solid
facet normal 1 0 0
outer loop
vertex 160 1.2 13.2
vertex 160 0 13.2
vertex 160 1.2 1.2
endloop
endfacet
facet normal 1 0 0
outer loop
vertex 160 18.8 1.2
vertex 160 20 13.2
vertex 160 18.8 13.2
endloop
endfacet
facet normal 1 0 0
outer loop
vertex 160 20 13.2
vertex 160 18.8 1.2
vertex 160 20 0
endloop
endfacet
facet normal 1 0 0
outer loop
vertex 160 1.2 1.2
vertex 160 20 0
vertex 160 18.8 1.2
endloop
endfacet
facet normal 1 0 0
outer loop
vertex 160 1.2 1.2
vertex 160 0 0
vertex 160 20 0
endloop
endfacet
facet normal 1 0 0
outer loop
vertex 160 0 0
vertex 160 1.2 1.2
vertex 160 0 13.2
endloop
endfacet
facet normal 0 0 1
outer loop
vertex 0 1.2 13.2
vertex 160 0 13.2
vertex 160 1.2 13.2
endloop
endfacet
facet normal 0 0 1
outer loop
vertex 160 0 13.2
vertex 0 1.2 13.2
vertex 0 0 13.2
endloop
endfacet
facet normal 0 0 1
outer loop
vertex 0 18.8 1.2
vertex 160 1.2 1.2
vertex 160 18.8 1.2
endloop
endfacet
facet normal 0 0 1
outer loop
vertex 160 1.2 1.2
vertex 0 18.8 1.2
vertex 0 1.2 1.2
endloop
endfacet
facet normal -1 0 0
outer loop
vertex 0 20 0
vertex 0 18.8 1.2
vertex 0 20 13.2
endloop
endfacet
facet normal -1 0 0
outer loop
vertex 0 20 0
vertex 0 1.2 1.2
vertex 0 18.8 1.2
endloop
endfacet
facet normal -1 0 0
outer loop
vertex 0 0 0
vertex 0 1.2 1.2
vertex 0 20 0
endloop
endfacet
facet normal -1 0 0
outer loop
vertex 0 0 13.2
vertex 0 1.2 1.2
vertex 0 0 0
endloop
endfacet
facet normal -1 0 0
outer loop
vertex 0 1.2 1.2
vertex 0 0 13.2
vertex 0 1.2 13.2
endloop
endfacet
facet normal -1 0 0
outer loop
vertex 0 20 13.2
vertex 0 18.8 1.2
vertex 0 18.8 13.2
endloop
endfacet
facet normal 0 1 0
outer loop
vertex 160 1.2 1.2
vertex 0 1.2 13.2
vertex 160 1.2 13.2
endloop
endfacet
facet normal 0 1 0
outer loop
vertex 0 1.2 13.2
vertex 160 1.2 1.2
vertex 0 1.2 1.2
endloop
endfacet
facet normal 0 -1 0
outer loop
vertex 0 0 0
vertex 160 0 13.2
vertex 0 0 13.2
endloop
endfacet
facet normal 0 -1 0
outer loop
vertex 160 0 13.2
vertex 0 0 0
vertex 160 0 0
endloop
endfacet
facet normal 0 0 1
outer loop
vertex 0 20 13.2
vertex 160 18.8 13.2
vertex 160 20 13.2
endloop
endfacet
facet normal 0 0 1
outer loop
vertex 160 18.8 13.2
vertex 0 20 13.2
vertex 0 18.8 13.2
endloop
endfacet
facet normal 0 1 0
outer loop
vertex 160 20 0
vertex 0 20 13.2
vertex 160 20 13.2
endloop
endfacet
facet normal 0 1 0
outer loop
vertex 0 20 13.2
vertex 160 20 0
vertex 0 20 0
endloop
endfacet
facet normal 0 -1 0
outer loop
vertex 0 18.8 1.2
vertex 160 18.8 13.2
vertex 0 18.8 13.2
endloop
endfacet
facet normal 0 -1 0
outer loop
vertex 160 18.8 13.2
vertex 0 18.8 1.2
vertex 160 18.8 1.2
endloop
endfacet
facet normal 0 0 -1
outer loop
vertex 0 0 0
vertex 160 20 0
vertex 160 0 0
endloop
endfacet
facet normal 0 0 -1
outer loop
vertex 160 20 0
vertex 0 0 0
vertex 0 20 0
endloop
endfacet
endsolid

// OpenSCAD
// ScienceClaw nominal U-channel. All dimensions in millimeters.
// Clamp the first clamp_length along x. No holes or clamp reinforcement.
// Print parameters, layer orientation, material batch, and actual dimensions
// must be recorded separately; this file does not prescribe a qualified process.
length = 160;
clamp_length = 25;
base_width = 20;
wall_height = 12;
thickness = 1.2;
assert(length > clamp_length && clamp_length > 0);
assert(base_width > 2 * thickness && thickness > 0 && wall_height >= 0);
union() {
    cube([length, base_width, thickness]);
    if (wall_height > 0) {
        translate([0, 0, thickness]) cube([length, thickness, wall_height]);
        translate([0, base_width - thickness, thickness]) cube([length, thickness, wall_height]);
    }
}
